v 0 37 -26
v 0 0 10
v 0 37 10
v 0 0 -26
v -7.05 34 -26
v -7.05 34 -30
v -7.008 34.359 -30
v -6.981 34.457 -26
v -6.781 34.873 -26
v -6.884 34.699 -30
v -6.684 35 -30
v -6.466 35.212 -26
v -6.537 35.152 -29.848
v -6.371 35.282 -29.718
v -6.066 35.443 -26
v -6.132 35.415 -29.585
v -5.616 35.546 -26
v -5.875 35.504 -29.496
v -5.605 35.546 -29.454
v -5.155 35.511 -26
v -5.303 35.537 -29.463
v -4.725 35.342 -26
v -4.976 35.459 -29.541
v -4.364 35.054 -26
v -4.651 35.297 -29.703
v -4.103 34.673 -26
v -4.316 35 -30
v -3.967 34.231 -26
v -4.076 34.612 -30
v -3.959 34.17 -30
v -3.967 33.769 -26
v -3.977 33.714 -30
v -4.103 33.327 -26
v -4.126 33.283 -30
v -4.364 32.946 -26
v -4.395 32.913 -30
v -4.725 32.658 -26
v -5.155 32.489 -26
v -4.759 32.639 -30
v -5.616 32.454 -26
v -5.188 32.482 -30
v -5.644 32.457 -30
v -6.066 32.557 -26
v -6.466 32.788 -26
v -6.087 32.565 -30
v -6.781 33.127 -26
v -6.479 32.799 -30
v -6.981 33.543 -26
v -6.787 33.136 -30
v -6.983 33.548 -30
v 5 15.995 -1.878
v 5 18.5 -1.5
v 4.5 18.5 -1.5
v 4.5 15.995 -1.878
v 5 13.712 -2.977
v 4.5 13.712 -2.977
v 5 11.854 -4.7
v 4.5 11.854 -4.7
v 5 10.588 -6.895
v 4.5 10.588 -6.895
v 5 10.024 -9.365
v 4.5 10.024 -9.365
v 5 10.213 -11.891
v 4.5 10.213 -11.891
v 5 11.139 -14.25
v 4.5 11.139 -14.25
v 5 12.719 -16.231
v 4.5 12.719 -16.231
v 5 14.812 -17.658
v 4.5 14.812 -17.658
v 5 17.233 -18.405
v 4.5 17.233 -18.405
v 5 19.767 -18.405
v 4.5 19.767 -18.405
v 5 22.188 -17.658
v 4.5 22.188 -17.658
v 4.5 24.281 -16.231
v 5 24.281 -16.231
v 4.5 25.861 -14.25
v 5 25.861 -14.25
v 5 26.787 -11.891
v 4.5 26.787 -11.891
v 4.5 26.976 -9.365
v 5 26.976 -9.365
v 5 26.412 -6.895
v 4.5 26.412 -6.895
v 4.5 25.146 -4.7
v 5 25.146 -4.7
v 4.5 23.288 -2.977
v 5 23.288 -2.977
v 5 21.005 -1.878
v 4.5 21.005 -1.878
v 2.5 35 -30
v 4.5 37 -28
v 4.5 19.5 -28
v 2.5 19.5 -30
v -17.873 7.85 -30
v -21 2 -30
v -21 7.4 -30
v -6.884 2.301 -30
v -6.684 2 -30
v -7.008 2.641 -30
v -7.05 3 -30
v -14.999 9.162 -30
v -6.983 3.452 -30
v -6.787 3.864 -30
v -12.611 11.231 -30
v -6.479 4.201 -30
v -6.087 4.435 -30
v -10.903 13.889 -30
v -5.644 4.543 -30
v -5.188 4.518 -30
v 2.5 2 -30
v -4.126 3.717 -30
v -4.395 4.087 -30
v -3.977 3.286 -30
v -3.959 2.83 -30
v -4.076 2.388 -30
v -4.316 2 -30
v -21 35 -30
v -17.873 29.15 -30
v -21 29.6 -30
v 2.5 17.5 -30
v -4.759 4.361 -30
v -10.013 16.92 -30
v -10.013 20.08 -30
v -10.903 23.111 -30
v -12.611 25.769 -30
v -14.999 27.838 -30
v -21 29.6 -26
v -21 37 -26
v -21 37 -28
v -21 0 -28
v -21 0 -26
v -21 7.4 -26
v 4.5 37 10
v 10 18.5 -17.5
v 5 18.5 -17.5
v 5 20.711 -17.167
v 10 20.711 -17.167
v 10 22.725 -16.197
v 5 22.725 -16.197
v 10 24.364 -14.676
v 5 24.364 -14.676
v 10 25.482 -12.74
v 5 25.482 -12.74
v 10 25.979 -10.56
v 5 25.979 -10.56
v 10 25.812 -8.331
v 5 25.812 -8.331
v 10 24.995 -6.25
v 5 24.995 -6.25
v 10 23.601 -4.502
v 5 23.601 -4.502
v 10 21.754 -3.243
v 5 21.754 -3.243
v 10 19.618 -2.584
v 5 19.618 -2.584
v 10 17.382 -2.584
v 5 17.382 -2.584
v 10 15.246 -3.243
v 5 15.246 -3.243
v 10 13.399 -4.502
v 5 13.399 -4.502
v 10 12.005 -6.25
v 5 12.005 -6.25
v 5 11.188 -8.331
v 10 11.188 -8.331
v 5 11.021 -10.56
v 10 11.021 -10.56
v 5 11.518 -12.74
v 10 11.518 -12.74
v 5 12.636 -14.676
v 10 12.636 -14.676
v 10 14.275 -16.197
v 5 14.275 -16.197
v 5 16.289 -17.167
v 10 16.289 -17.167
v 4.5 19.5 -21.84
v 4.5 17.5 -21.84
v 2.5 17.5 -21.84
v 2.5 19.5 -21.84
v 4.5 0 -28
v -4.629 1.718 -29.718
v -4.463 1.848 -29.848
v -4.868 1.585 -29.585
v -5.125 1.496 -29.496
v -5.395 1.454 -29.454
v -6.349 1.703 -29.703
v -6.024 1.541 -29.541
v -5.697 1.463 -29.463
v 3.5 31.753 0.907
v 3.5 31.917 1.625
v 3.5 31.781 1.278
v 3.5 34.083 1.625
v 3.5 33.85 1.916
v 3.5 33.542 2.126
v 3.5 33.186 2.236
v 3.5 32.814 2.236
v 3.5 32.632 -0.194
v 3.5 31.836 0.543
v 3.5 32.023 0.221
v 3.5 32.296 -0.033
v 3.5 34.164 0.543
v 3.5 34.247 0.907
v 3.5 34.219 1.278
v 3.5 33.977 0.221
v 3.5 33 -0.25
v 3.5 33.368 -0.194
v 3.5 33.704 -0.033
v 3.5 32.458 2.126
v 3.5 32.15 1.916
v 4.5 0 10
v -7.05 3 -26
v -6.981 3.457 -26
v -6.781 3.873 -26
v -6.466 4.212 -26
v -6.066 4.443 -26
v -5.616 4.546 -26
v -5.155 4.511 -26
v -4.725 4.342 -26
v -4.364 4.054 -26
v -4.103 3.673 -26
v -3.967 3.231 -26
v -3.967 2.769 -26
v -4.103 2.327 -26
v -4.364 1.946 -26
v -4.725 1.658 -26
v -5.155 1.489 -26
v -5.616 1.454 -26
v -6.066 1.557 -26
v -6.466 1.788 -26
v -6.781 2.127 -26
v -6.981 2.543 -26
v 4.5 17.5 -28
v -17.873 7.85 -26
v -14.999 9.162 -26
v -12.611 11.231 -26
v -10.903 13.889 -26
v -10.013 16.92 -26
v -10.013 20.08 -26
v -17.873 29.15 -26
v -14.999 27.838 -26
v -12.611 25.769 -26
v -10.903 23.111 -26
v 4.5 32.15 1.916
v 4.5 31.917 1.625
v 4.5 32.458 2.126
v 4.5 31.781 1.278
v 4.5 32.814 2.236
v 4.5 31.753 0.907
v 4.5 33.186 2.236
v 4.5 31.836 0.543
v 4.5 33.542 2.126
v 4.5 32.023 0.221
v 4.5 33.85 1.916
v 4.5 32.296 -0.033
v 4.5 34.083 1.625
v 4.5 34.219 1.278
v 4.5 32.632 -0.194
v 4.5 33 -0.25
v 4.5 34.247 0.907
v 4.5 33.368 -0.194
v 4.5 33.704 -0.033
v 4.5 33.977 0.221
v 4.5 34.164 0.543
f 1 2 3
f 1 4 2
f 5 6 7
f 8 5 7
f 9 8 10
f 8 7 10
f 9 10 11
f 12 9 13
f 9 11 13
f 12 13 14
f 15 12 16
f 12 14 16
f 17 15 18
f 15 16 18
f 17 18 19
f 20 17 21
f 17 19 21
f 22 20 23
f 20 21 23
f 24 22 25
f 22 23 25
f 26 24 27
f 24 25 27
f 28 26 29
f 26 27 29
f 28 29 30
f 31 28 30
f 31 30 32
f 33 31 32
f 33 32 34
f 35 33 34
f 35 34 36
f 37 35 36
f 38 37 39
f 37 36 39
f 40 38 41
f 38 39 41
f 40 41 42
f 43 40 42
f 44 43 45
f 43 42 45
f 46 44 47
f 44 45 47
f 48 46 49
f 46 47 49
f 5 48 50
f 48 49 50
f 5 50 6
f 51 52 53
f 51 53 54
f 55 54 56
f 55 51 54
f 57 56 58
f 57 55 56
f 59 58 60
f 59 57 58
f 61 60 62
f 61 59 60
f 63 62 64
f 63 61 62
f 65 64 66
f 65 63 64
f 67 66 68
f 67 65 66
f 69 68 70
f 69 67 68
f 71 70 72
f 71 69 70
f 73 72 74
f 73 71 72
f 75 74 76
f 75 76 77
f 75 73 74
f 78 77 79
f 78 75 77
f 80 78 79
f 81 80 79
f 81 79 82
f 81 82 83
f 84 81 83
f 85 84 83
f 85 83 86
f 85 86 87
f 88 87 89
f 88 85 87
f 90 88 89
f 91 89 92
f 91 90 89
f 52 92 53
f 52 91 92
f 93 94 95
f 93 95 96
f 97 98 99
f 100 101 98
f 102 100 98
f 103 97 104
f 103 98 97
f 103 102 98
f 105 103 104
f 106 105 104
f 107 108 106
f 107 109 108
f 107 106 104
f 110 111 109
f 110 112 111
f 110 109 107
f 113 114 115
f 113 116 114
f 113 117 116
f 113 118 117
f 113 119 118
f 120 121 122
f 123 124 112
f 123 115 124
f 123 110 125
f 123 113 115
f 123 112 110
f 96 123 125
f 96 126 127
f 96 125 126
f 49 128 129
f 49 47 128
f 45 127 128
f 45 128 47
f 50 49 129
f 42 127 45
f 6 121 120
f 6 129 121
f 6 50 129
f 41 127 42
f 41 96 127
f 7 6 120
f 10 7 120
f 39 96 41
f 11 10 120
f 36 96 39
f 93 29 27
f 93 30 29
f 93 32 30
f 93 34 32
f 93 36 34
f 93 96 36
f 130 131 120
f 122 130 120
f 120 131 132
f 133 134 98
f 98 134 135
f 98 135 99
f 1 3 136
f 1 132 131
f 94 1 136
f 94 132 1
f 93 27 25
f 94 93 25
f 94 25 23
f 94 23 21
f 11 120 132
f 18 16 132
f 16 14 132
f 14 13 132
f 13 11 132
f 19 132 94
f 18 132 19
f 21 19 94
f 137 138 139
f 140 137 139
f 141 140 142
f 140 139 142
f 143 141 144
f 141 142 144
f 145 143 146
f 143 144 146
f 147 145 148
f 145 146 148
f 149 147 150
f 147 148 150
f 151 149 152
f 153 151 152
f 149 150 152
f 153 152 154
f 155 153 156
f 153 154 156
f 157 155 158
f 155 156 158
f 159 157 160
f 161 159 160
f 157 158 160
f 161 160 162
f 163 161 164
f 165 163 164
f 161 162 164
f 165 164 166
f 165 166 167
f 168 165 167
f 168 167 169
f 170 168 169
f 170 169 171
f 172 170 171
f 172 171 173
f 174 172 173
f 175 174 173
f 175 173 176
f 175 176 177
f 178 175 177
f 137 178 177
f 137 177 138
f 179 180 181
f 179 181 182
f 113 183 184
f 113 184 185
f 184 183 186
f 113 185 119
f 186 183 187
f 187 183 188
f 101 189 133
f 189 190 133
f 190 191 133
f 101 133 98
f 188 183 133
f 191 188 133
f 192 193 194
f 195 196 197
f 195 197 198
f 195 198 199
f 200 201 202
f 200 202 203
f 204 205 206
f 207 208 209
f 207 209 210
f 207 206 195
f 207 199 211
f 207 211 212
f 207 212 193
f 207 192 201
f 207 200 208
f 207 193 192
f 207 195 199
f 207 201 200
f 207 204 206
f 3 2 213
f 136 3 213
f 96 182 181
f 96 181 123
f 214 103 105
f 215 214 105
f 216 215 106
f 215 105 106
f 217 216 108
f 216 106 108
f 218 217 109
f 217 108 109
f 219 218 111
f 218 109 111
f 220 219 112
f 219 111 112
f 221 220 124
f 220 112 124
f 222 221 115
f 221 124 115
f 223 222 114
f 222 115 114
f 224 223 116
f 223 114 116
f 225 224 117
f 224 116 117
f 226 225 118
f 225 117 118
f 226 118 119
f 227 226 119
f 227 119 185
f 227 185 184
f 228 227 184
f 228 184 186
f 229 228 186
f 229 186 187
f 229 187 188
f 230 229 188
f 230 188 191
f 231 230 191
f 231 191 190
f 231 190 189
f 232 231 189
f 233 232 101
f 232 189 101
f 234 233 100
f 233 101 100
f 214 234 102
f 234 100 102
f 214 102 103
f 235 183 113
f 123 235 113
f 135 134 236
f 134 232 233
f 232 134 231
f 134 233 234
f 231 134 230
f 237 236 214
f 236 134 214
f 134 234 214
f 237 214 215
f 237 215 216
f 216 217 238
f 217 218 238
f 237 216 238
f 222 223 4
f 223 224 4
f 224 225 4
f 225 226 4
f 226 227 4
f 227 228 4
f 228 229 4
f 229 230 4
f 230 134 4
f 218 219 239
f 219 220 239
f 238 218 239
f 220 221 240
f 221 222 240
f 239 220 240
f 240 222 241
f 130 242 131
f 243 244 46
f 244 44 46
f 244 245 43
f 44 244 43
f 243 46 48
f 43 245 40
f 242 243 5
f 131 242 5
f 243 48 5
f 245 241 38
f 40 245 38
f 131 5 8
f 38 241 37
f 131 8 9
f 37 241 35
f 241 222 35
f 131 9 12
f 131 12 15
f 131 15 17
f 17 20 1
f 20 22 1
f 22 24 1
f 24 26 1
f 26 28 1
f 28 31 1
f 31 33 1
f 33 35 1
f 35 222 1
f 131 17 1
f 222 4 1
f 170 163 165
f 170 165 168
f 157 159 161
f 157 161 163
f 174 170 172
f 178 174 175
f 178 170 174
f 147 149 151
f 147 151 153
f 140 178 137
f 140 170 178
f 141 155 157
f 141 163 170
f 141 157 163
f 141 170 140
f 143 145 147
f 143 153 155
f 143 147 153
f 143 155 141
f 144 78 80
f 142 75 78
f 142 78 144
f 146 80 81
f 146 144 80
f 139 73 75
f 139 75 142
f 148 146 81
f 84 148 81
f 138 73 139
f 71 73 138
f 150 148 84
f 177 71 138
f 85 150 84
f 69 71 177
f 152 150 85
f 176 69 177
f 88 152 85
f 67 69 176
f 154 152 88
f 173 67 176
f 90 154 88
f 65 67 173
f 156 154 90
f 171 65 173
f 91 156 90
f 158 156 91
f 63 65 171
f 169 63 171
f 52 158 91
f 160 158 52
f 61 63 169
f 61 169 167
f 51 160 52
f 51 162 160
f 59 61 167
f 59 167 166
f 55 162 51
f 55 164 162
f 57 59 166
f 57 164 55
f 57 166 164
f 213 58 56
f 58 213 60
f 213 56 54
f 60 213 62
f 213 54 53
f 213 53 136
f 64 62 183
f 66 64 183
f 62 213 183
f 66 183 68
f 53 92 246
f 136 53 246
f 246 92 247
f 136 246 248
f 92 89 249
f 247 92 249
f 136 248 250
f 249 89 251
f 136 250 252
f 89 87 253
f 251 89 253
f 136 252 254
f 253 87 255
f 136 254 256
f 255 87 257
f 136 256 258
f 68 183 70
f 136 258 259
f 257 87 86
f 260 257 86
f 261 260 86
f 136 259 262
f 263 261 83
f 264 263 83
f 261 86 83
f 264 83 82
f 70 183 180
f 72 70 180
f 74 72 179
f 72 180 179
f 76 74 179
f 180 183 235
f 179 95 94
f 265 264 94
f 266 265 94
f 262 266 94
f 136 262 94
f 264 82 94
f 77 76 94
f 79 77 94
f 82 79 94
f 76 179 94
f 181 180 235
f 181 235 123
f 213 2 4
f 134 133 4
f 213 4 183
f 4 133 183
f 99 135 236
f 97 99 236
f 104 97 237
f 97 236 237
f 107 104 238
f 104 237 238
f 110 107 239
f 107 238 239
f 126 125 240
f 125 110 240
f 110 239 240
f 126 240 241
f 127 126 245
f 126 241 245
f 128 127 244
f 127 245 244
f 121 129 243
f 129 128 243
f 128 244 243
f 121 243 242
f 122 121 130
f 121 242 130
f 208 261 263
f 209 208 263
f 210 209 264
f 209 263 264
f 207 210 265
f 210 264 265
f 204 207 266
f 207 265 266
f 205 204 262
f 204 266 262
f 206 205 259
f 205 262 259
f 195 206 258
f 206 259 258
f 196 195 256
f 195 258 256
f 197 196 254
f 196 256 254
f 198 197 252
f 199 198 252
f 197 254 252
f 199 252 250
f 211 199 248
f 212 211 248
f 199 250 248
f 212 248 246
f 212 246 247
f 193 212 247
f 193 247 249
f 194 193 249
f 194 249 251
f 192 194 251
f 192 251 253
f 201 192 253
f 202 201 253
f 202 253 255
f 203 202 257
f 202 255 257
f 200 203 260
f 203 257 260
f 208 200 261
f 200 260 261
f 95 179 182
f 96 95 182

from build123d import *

# Parameters (mm, degrees)
SKETCH1_W           = 30
SKETCH1_H           = 37
BOSS_EXTRUDE1_DEPTH = 4.5
SKETCH2_W           = 4
SKETCH2_H           = 37
BOSS_EXTRUDE2_DEPTH = 42
SKETCH3_W           = 30
SKETCH3_H           = 37
BOSS_EXTRUDE3_DEPTH = 4.5
SKETCH8_R           = 11.1
CUT_EXTRUDE1_DEPTH  = 4
SKETCH9_R           = 1.55
CUT_EXTRUDE2_DEPTH  = 4
CHAMFER3_SIZE       = 2
SKETCH_6_R          = 7.5
EXTRUDE_2_DEPTH     = 5.5
SKETCH_5_R          = 4
EXTRUDE_1_DEPTH     = 20.5
SKETCH_15_R         = 8.5
EXTRUDE_6_DEPTH     = 0.5
EXTRUDE_START       = 0.5
SKETCH_16_R         = 8.5
SKETCH_16_R_2       = 7.45
EXTRUDE_7_DEPTH     = 0.5
SKETCH_17_W         = 4.5
SKETCH_17_H         = 37
EXTRUDE_8_DEPTH     = 10
SKETCH_23_R         = 1.25
CUT_EXTRUDE_4_DEPTH = 1
EXTRUDE_START_2     = -20.5
EXTRUDE_11_DEPTH    = 20.5
CUT_EXTRUDE_5_DEPTH = 67.219332525
SKETCH_27_W         = 8.159891724
SKETCH_27_H         = 2
CUT_EXTRUDE_6_DEPTH = 2


with BuildPart() as part:
    # Sketch1 → Boss-Extrude1 (new body)
    with BuildSketch(Plane(origin=(0, 0, 0), x_dir=(0, 0, -1), z_dir=(1, 0, 0))):
        with Locations((15, 18.5)):
            Rectangle(SKETCH1_W, SKETCH1_H)
    extrude(amount=BOSS_EXTRUDE1_DEPTH)

    # Sketch2 → Boss-Extrude2 (add)
    with BuildSketch(Plane.ZY):
        with Locations((-28, 18.5)):
            Rectangle(SKETCH2_W, SKETCH2_H)
    extrude(amount=BOSS_EXTRUDE2_DEPTH)

    # Sketch3 → Boss-Extrude3 (add)
    with BuildSketch(Plane.ZY.offset(42)):
        with Locations((-15, 18.5)):
            Rectangle(SKETCH3_W, SKETCH3_H)
    extrude(amount=BOSS_EXTRUDE3_DEPTH)

    # Sketch8 → Cut-Extrude1 (cut)
    with BuildSketch(Plane.XY.offset(-26)):
        with Locations((-21, 18.5)):
            Circle(SKETCH8_R)
    extrude(amount=-CUT_EXTRUDE1_DEPTH, mode=Mode.SUBTRACT)

    # Sketch9 → Cut-Extrude2 (cut)
    with BuildSketch(Plane(origin=(0, 0, -30), x_dir=(-1, 0, 0), z_dir=(0, 0, -1))):
        with Locations((5.5, 34)):
            Circle(SKETCH9_R)
        with Locations((36.5, 34)):
            Circle(SKETCH9_R)
        with Locations((36.5, 3)):
            Circle(SKETCH9_R)
        with Locations((5.5, 3)):
            Circle(SKETCH9_R)
    extrude(amount=-CUT_EXTRUDE2_DEPTH, mode=Mode.SUBTRACT)

    # Chamfer3
    # the kernel refuses this chamfer: 2 mm, written as the material it takes off along each edge
    with BuildSketch(Plane(origin=(4.5, -5.143365976, -30), x_dir=(0.02749587661058651, 0, 0.9996219169112968), z_dir=(0, 1, 0))) as chamfer3_piece_1:
        Polygon((CHAMFER3_SIZE * 0.999621916911, -CHAMFER3_SIZE * 0.0274958766106), (-CHAMFER3_SIZE * 0.0274958766106, -CHAMFER3_SIZE * 0.999621916911), (0, 0), align=None)
    extrude(amount=47.286731952, mode=Mode.SUBTRACT)
    with BuildSketch(Plane(origin=(-46.5, 42.143365976, -30), x_dir=(0.9996219169112968, 0, -0.027495876610585647), z_dir=(0, -1, 0))) as chamfer3_piece_2:
        Polygon((CHAMFER3_SIZE * 0.999621916911, CHAMFER3_SIZE * 0.0274958766106), (-CHAMFER3_SIZE * 0.0274958766106, CHAMFER3_SIZE * 0.999621916911), (0, 0), align=None)
    extrude(amount=47.286731952, mode=Mode.SUBTRACT)
    with BuildSketch(Plane(origin=(-51.643365976, 37, -30), x_dir=(0, -0.9996219169112968, -0.027495876610585647), z_dir=(1, 0, 0)), Plane(origin=(-51.643365976, 0, -30), x_dir=(0, -0.02749587661058639, 0.9996219169112968), z_dir=(1, 0, 0))) as chamfer3_piece_3:
        Polygon((CHAMFER3_SIZE * 0.999621916911, -CHAMFER3_SIZE * 0.0274958766106), (-CHAMFER3_SIZE * 0.0274958766106, -CHAMFER3_SIZE * 0.999621916911), (0, 0), align=None)
    extrude(amount=61.286731952, mode=Mode.SUBTRACT)

    # 草图6 → 凸台-拉伸2 (add)
    with BuildSketch(Plane(origin=(4.5, 0, 0), x_dir=(0, 0, -1), z_dir=(1, 0, 0))):
        with Locations((10, 18.5)):
            Circle(SKETCH_6_R)
    extrude(amount=EXTRUDE_2_DEPTH)

    # 草图5 → 凸台-拉伸1 (add)
    with BuildSketch(Plane.ZY.offset(46.5)):
        with Locations((-10, 18.5)):
            Circle(SKETCH_5_R)
    extrude(amount=EXTRUDE_1_DEPTH)

    # 草图15 → 凸台-拉伸6 (add)
    with BuildSketch(Plane.ZY.offset(46.5)):
        with Locations((-10, 18.5)):
            Circle(SKETCH_15_R)
    extrude(amount=EXTRUDE_6_DEPTH)

    # 草图16 → 凸台-拉伸7 (add)
    with BuildSketch(Plane(origin=(4.5, 0, 0), x_dir=(0, 0, -1), z_dir=(1, 0, 0)).offset(EXTRUDE_START)):
        with Locations(Location((10, 18.5, 0), (0, 0, 180))):
            Circle(SKETCH_16_R)
        with Locations((10, 18.5)):
            Circle(SKETCH_16_R_2, mode=Mode.SUBTRACT)
    extrude(amount=-EXTRUDE_7_DEPTH)

    # 草图17 → 凸台-拉伸8 (add)
    with BuildSketch(Plane.XY):
        with Locations((2.25, 18.5)):
            Rectangle(SKETCH_17_W, SKETCH_17_H)
    extrude(amount=EXTRUDE_8_DEPTH)

    # 草图23 → 切除-拉伸4 (cut)
    with BuildSketch(Plane(origin=(4.5, 0, 0), x_dir=(0, 0, -1), z_dir=(1, 0, 0))):
        with Locations((-1, 33)):
            Circle(SKETCH_23_R)
    extrude(amount=-CUT_EXTRUDE_4_DEPTH, mode=Mode.SUBTRACT)

    # 草图26 → 凸台-拉伸11 (add)
    with BuildSketch(Plane.ZY.offset(67).offset(EXTRUDE_START_2)):
        with BuildLine():
            ThreePointArc((-8.063508327, 22), (-10, 23.5), (-11.936491673, 22))
            ThreePointArc((-11.936491673, 22), (-10, 22.5), (-8.063508327, 22))
        make_face()
        with BuildLine():
            ThreePointArc((-13.5, 16.563508327), (-14, 18.5), (-13.5, 20.436491673))
            ThreePointArc((-13.5, 20.436491673), (-15, 18.5), (-13.5, 16.563508327))
        make_face()
        with BuildLine():
            ThreePointArc((-6.5, 16.563508327), (-5, 18.5), (-6.5, 20.436491673))
            ThreePointArc((-6.5, 20.436491673), (-6, 18.5), (-6.5, 16.563508327))
        make_face()
        with BuildLine():
            ThreePointArc((-8.063508327, 15), (-10, 14.5), (-11.936491673, 15))
            ThreePointArc((-11.936491673, 15), (-10, 13.5), (-8.063508327, 15))
        make_face()
    extrude(amount=EXTRUDE_11_DEPTH)

    # 草图25 → 切除-拉伸5 (cut, through all)
    with BuildSketch(Plane.ZY.offset(21)):
        Polygon((21.58280616, 37.67604856), (19.928852176, -12.32395144), (-38.530236753, -10.39017858), (-38.530236753, 37.67604856), align=None)
    extrude(amount=CUT_EXTRUDE_5_DEPTH, mode=Mode.SUBTRACT)

    # 草图27 → 切除-拉伸6 (cut)
    with BuildSketch(Plane(origin=(4.5, 0, 0), x_dir=(0, 0, -1), z_dir=(1, 0, 0))):
        with Locations((25.920054138, 18.5)):
            Rectangle(SKETCH_27_W, SKETCH_27_H)
    extrude(amount=-CUT_EXTRUDE_6_DEPTH, mode=Mode.SUBTRACT)


solid = part.part
